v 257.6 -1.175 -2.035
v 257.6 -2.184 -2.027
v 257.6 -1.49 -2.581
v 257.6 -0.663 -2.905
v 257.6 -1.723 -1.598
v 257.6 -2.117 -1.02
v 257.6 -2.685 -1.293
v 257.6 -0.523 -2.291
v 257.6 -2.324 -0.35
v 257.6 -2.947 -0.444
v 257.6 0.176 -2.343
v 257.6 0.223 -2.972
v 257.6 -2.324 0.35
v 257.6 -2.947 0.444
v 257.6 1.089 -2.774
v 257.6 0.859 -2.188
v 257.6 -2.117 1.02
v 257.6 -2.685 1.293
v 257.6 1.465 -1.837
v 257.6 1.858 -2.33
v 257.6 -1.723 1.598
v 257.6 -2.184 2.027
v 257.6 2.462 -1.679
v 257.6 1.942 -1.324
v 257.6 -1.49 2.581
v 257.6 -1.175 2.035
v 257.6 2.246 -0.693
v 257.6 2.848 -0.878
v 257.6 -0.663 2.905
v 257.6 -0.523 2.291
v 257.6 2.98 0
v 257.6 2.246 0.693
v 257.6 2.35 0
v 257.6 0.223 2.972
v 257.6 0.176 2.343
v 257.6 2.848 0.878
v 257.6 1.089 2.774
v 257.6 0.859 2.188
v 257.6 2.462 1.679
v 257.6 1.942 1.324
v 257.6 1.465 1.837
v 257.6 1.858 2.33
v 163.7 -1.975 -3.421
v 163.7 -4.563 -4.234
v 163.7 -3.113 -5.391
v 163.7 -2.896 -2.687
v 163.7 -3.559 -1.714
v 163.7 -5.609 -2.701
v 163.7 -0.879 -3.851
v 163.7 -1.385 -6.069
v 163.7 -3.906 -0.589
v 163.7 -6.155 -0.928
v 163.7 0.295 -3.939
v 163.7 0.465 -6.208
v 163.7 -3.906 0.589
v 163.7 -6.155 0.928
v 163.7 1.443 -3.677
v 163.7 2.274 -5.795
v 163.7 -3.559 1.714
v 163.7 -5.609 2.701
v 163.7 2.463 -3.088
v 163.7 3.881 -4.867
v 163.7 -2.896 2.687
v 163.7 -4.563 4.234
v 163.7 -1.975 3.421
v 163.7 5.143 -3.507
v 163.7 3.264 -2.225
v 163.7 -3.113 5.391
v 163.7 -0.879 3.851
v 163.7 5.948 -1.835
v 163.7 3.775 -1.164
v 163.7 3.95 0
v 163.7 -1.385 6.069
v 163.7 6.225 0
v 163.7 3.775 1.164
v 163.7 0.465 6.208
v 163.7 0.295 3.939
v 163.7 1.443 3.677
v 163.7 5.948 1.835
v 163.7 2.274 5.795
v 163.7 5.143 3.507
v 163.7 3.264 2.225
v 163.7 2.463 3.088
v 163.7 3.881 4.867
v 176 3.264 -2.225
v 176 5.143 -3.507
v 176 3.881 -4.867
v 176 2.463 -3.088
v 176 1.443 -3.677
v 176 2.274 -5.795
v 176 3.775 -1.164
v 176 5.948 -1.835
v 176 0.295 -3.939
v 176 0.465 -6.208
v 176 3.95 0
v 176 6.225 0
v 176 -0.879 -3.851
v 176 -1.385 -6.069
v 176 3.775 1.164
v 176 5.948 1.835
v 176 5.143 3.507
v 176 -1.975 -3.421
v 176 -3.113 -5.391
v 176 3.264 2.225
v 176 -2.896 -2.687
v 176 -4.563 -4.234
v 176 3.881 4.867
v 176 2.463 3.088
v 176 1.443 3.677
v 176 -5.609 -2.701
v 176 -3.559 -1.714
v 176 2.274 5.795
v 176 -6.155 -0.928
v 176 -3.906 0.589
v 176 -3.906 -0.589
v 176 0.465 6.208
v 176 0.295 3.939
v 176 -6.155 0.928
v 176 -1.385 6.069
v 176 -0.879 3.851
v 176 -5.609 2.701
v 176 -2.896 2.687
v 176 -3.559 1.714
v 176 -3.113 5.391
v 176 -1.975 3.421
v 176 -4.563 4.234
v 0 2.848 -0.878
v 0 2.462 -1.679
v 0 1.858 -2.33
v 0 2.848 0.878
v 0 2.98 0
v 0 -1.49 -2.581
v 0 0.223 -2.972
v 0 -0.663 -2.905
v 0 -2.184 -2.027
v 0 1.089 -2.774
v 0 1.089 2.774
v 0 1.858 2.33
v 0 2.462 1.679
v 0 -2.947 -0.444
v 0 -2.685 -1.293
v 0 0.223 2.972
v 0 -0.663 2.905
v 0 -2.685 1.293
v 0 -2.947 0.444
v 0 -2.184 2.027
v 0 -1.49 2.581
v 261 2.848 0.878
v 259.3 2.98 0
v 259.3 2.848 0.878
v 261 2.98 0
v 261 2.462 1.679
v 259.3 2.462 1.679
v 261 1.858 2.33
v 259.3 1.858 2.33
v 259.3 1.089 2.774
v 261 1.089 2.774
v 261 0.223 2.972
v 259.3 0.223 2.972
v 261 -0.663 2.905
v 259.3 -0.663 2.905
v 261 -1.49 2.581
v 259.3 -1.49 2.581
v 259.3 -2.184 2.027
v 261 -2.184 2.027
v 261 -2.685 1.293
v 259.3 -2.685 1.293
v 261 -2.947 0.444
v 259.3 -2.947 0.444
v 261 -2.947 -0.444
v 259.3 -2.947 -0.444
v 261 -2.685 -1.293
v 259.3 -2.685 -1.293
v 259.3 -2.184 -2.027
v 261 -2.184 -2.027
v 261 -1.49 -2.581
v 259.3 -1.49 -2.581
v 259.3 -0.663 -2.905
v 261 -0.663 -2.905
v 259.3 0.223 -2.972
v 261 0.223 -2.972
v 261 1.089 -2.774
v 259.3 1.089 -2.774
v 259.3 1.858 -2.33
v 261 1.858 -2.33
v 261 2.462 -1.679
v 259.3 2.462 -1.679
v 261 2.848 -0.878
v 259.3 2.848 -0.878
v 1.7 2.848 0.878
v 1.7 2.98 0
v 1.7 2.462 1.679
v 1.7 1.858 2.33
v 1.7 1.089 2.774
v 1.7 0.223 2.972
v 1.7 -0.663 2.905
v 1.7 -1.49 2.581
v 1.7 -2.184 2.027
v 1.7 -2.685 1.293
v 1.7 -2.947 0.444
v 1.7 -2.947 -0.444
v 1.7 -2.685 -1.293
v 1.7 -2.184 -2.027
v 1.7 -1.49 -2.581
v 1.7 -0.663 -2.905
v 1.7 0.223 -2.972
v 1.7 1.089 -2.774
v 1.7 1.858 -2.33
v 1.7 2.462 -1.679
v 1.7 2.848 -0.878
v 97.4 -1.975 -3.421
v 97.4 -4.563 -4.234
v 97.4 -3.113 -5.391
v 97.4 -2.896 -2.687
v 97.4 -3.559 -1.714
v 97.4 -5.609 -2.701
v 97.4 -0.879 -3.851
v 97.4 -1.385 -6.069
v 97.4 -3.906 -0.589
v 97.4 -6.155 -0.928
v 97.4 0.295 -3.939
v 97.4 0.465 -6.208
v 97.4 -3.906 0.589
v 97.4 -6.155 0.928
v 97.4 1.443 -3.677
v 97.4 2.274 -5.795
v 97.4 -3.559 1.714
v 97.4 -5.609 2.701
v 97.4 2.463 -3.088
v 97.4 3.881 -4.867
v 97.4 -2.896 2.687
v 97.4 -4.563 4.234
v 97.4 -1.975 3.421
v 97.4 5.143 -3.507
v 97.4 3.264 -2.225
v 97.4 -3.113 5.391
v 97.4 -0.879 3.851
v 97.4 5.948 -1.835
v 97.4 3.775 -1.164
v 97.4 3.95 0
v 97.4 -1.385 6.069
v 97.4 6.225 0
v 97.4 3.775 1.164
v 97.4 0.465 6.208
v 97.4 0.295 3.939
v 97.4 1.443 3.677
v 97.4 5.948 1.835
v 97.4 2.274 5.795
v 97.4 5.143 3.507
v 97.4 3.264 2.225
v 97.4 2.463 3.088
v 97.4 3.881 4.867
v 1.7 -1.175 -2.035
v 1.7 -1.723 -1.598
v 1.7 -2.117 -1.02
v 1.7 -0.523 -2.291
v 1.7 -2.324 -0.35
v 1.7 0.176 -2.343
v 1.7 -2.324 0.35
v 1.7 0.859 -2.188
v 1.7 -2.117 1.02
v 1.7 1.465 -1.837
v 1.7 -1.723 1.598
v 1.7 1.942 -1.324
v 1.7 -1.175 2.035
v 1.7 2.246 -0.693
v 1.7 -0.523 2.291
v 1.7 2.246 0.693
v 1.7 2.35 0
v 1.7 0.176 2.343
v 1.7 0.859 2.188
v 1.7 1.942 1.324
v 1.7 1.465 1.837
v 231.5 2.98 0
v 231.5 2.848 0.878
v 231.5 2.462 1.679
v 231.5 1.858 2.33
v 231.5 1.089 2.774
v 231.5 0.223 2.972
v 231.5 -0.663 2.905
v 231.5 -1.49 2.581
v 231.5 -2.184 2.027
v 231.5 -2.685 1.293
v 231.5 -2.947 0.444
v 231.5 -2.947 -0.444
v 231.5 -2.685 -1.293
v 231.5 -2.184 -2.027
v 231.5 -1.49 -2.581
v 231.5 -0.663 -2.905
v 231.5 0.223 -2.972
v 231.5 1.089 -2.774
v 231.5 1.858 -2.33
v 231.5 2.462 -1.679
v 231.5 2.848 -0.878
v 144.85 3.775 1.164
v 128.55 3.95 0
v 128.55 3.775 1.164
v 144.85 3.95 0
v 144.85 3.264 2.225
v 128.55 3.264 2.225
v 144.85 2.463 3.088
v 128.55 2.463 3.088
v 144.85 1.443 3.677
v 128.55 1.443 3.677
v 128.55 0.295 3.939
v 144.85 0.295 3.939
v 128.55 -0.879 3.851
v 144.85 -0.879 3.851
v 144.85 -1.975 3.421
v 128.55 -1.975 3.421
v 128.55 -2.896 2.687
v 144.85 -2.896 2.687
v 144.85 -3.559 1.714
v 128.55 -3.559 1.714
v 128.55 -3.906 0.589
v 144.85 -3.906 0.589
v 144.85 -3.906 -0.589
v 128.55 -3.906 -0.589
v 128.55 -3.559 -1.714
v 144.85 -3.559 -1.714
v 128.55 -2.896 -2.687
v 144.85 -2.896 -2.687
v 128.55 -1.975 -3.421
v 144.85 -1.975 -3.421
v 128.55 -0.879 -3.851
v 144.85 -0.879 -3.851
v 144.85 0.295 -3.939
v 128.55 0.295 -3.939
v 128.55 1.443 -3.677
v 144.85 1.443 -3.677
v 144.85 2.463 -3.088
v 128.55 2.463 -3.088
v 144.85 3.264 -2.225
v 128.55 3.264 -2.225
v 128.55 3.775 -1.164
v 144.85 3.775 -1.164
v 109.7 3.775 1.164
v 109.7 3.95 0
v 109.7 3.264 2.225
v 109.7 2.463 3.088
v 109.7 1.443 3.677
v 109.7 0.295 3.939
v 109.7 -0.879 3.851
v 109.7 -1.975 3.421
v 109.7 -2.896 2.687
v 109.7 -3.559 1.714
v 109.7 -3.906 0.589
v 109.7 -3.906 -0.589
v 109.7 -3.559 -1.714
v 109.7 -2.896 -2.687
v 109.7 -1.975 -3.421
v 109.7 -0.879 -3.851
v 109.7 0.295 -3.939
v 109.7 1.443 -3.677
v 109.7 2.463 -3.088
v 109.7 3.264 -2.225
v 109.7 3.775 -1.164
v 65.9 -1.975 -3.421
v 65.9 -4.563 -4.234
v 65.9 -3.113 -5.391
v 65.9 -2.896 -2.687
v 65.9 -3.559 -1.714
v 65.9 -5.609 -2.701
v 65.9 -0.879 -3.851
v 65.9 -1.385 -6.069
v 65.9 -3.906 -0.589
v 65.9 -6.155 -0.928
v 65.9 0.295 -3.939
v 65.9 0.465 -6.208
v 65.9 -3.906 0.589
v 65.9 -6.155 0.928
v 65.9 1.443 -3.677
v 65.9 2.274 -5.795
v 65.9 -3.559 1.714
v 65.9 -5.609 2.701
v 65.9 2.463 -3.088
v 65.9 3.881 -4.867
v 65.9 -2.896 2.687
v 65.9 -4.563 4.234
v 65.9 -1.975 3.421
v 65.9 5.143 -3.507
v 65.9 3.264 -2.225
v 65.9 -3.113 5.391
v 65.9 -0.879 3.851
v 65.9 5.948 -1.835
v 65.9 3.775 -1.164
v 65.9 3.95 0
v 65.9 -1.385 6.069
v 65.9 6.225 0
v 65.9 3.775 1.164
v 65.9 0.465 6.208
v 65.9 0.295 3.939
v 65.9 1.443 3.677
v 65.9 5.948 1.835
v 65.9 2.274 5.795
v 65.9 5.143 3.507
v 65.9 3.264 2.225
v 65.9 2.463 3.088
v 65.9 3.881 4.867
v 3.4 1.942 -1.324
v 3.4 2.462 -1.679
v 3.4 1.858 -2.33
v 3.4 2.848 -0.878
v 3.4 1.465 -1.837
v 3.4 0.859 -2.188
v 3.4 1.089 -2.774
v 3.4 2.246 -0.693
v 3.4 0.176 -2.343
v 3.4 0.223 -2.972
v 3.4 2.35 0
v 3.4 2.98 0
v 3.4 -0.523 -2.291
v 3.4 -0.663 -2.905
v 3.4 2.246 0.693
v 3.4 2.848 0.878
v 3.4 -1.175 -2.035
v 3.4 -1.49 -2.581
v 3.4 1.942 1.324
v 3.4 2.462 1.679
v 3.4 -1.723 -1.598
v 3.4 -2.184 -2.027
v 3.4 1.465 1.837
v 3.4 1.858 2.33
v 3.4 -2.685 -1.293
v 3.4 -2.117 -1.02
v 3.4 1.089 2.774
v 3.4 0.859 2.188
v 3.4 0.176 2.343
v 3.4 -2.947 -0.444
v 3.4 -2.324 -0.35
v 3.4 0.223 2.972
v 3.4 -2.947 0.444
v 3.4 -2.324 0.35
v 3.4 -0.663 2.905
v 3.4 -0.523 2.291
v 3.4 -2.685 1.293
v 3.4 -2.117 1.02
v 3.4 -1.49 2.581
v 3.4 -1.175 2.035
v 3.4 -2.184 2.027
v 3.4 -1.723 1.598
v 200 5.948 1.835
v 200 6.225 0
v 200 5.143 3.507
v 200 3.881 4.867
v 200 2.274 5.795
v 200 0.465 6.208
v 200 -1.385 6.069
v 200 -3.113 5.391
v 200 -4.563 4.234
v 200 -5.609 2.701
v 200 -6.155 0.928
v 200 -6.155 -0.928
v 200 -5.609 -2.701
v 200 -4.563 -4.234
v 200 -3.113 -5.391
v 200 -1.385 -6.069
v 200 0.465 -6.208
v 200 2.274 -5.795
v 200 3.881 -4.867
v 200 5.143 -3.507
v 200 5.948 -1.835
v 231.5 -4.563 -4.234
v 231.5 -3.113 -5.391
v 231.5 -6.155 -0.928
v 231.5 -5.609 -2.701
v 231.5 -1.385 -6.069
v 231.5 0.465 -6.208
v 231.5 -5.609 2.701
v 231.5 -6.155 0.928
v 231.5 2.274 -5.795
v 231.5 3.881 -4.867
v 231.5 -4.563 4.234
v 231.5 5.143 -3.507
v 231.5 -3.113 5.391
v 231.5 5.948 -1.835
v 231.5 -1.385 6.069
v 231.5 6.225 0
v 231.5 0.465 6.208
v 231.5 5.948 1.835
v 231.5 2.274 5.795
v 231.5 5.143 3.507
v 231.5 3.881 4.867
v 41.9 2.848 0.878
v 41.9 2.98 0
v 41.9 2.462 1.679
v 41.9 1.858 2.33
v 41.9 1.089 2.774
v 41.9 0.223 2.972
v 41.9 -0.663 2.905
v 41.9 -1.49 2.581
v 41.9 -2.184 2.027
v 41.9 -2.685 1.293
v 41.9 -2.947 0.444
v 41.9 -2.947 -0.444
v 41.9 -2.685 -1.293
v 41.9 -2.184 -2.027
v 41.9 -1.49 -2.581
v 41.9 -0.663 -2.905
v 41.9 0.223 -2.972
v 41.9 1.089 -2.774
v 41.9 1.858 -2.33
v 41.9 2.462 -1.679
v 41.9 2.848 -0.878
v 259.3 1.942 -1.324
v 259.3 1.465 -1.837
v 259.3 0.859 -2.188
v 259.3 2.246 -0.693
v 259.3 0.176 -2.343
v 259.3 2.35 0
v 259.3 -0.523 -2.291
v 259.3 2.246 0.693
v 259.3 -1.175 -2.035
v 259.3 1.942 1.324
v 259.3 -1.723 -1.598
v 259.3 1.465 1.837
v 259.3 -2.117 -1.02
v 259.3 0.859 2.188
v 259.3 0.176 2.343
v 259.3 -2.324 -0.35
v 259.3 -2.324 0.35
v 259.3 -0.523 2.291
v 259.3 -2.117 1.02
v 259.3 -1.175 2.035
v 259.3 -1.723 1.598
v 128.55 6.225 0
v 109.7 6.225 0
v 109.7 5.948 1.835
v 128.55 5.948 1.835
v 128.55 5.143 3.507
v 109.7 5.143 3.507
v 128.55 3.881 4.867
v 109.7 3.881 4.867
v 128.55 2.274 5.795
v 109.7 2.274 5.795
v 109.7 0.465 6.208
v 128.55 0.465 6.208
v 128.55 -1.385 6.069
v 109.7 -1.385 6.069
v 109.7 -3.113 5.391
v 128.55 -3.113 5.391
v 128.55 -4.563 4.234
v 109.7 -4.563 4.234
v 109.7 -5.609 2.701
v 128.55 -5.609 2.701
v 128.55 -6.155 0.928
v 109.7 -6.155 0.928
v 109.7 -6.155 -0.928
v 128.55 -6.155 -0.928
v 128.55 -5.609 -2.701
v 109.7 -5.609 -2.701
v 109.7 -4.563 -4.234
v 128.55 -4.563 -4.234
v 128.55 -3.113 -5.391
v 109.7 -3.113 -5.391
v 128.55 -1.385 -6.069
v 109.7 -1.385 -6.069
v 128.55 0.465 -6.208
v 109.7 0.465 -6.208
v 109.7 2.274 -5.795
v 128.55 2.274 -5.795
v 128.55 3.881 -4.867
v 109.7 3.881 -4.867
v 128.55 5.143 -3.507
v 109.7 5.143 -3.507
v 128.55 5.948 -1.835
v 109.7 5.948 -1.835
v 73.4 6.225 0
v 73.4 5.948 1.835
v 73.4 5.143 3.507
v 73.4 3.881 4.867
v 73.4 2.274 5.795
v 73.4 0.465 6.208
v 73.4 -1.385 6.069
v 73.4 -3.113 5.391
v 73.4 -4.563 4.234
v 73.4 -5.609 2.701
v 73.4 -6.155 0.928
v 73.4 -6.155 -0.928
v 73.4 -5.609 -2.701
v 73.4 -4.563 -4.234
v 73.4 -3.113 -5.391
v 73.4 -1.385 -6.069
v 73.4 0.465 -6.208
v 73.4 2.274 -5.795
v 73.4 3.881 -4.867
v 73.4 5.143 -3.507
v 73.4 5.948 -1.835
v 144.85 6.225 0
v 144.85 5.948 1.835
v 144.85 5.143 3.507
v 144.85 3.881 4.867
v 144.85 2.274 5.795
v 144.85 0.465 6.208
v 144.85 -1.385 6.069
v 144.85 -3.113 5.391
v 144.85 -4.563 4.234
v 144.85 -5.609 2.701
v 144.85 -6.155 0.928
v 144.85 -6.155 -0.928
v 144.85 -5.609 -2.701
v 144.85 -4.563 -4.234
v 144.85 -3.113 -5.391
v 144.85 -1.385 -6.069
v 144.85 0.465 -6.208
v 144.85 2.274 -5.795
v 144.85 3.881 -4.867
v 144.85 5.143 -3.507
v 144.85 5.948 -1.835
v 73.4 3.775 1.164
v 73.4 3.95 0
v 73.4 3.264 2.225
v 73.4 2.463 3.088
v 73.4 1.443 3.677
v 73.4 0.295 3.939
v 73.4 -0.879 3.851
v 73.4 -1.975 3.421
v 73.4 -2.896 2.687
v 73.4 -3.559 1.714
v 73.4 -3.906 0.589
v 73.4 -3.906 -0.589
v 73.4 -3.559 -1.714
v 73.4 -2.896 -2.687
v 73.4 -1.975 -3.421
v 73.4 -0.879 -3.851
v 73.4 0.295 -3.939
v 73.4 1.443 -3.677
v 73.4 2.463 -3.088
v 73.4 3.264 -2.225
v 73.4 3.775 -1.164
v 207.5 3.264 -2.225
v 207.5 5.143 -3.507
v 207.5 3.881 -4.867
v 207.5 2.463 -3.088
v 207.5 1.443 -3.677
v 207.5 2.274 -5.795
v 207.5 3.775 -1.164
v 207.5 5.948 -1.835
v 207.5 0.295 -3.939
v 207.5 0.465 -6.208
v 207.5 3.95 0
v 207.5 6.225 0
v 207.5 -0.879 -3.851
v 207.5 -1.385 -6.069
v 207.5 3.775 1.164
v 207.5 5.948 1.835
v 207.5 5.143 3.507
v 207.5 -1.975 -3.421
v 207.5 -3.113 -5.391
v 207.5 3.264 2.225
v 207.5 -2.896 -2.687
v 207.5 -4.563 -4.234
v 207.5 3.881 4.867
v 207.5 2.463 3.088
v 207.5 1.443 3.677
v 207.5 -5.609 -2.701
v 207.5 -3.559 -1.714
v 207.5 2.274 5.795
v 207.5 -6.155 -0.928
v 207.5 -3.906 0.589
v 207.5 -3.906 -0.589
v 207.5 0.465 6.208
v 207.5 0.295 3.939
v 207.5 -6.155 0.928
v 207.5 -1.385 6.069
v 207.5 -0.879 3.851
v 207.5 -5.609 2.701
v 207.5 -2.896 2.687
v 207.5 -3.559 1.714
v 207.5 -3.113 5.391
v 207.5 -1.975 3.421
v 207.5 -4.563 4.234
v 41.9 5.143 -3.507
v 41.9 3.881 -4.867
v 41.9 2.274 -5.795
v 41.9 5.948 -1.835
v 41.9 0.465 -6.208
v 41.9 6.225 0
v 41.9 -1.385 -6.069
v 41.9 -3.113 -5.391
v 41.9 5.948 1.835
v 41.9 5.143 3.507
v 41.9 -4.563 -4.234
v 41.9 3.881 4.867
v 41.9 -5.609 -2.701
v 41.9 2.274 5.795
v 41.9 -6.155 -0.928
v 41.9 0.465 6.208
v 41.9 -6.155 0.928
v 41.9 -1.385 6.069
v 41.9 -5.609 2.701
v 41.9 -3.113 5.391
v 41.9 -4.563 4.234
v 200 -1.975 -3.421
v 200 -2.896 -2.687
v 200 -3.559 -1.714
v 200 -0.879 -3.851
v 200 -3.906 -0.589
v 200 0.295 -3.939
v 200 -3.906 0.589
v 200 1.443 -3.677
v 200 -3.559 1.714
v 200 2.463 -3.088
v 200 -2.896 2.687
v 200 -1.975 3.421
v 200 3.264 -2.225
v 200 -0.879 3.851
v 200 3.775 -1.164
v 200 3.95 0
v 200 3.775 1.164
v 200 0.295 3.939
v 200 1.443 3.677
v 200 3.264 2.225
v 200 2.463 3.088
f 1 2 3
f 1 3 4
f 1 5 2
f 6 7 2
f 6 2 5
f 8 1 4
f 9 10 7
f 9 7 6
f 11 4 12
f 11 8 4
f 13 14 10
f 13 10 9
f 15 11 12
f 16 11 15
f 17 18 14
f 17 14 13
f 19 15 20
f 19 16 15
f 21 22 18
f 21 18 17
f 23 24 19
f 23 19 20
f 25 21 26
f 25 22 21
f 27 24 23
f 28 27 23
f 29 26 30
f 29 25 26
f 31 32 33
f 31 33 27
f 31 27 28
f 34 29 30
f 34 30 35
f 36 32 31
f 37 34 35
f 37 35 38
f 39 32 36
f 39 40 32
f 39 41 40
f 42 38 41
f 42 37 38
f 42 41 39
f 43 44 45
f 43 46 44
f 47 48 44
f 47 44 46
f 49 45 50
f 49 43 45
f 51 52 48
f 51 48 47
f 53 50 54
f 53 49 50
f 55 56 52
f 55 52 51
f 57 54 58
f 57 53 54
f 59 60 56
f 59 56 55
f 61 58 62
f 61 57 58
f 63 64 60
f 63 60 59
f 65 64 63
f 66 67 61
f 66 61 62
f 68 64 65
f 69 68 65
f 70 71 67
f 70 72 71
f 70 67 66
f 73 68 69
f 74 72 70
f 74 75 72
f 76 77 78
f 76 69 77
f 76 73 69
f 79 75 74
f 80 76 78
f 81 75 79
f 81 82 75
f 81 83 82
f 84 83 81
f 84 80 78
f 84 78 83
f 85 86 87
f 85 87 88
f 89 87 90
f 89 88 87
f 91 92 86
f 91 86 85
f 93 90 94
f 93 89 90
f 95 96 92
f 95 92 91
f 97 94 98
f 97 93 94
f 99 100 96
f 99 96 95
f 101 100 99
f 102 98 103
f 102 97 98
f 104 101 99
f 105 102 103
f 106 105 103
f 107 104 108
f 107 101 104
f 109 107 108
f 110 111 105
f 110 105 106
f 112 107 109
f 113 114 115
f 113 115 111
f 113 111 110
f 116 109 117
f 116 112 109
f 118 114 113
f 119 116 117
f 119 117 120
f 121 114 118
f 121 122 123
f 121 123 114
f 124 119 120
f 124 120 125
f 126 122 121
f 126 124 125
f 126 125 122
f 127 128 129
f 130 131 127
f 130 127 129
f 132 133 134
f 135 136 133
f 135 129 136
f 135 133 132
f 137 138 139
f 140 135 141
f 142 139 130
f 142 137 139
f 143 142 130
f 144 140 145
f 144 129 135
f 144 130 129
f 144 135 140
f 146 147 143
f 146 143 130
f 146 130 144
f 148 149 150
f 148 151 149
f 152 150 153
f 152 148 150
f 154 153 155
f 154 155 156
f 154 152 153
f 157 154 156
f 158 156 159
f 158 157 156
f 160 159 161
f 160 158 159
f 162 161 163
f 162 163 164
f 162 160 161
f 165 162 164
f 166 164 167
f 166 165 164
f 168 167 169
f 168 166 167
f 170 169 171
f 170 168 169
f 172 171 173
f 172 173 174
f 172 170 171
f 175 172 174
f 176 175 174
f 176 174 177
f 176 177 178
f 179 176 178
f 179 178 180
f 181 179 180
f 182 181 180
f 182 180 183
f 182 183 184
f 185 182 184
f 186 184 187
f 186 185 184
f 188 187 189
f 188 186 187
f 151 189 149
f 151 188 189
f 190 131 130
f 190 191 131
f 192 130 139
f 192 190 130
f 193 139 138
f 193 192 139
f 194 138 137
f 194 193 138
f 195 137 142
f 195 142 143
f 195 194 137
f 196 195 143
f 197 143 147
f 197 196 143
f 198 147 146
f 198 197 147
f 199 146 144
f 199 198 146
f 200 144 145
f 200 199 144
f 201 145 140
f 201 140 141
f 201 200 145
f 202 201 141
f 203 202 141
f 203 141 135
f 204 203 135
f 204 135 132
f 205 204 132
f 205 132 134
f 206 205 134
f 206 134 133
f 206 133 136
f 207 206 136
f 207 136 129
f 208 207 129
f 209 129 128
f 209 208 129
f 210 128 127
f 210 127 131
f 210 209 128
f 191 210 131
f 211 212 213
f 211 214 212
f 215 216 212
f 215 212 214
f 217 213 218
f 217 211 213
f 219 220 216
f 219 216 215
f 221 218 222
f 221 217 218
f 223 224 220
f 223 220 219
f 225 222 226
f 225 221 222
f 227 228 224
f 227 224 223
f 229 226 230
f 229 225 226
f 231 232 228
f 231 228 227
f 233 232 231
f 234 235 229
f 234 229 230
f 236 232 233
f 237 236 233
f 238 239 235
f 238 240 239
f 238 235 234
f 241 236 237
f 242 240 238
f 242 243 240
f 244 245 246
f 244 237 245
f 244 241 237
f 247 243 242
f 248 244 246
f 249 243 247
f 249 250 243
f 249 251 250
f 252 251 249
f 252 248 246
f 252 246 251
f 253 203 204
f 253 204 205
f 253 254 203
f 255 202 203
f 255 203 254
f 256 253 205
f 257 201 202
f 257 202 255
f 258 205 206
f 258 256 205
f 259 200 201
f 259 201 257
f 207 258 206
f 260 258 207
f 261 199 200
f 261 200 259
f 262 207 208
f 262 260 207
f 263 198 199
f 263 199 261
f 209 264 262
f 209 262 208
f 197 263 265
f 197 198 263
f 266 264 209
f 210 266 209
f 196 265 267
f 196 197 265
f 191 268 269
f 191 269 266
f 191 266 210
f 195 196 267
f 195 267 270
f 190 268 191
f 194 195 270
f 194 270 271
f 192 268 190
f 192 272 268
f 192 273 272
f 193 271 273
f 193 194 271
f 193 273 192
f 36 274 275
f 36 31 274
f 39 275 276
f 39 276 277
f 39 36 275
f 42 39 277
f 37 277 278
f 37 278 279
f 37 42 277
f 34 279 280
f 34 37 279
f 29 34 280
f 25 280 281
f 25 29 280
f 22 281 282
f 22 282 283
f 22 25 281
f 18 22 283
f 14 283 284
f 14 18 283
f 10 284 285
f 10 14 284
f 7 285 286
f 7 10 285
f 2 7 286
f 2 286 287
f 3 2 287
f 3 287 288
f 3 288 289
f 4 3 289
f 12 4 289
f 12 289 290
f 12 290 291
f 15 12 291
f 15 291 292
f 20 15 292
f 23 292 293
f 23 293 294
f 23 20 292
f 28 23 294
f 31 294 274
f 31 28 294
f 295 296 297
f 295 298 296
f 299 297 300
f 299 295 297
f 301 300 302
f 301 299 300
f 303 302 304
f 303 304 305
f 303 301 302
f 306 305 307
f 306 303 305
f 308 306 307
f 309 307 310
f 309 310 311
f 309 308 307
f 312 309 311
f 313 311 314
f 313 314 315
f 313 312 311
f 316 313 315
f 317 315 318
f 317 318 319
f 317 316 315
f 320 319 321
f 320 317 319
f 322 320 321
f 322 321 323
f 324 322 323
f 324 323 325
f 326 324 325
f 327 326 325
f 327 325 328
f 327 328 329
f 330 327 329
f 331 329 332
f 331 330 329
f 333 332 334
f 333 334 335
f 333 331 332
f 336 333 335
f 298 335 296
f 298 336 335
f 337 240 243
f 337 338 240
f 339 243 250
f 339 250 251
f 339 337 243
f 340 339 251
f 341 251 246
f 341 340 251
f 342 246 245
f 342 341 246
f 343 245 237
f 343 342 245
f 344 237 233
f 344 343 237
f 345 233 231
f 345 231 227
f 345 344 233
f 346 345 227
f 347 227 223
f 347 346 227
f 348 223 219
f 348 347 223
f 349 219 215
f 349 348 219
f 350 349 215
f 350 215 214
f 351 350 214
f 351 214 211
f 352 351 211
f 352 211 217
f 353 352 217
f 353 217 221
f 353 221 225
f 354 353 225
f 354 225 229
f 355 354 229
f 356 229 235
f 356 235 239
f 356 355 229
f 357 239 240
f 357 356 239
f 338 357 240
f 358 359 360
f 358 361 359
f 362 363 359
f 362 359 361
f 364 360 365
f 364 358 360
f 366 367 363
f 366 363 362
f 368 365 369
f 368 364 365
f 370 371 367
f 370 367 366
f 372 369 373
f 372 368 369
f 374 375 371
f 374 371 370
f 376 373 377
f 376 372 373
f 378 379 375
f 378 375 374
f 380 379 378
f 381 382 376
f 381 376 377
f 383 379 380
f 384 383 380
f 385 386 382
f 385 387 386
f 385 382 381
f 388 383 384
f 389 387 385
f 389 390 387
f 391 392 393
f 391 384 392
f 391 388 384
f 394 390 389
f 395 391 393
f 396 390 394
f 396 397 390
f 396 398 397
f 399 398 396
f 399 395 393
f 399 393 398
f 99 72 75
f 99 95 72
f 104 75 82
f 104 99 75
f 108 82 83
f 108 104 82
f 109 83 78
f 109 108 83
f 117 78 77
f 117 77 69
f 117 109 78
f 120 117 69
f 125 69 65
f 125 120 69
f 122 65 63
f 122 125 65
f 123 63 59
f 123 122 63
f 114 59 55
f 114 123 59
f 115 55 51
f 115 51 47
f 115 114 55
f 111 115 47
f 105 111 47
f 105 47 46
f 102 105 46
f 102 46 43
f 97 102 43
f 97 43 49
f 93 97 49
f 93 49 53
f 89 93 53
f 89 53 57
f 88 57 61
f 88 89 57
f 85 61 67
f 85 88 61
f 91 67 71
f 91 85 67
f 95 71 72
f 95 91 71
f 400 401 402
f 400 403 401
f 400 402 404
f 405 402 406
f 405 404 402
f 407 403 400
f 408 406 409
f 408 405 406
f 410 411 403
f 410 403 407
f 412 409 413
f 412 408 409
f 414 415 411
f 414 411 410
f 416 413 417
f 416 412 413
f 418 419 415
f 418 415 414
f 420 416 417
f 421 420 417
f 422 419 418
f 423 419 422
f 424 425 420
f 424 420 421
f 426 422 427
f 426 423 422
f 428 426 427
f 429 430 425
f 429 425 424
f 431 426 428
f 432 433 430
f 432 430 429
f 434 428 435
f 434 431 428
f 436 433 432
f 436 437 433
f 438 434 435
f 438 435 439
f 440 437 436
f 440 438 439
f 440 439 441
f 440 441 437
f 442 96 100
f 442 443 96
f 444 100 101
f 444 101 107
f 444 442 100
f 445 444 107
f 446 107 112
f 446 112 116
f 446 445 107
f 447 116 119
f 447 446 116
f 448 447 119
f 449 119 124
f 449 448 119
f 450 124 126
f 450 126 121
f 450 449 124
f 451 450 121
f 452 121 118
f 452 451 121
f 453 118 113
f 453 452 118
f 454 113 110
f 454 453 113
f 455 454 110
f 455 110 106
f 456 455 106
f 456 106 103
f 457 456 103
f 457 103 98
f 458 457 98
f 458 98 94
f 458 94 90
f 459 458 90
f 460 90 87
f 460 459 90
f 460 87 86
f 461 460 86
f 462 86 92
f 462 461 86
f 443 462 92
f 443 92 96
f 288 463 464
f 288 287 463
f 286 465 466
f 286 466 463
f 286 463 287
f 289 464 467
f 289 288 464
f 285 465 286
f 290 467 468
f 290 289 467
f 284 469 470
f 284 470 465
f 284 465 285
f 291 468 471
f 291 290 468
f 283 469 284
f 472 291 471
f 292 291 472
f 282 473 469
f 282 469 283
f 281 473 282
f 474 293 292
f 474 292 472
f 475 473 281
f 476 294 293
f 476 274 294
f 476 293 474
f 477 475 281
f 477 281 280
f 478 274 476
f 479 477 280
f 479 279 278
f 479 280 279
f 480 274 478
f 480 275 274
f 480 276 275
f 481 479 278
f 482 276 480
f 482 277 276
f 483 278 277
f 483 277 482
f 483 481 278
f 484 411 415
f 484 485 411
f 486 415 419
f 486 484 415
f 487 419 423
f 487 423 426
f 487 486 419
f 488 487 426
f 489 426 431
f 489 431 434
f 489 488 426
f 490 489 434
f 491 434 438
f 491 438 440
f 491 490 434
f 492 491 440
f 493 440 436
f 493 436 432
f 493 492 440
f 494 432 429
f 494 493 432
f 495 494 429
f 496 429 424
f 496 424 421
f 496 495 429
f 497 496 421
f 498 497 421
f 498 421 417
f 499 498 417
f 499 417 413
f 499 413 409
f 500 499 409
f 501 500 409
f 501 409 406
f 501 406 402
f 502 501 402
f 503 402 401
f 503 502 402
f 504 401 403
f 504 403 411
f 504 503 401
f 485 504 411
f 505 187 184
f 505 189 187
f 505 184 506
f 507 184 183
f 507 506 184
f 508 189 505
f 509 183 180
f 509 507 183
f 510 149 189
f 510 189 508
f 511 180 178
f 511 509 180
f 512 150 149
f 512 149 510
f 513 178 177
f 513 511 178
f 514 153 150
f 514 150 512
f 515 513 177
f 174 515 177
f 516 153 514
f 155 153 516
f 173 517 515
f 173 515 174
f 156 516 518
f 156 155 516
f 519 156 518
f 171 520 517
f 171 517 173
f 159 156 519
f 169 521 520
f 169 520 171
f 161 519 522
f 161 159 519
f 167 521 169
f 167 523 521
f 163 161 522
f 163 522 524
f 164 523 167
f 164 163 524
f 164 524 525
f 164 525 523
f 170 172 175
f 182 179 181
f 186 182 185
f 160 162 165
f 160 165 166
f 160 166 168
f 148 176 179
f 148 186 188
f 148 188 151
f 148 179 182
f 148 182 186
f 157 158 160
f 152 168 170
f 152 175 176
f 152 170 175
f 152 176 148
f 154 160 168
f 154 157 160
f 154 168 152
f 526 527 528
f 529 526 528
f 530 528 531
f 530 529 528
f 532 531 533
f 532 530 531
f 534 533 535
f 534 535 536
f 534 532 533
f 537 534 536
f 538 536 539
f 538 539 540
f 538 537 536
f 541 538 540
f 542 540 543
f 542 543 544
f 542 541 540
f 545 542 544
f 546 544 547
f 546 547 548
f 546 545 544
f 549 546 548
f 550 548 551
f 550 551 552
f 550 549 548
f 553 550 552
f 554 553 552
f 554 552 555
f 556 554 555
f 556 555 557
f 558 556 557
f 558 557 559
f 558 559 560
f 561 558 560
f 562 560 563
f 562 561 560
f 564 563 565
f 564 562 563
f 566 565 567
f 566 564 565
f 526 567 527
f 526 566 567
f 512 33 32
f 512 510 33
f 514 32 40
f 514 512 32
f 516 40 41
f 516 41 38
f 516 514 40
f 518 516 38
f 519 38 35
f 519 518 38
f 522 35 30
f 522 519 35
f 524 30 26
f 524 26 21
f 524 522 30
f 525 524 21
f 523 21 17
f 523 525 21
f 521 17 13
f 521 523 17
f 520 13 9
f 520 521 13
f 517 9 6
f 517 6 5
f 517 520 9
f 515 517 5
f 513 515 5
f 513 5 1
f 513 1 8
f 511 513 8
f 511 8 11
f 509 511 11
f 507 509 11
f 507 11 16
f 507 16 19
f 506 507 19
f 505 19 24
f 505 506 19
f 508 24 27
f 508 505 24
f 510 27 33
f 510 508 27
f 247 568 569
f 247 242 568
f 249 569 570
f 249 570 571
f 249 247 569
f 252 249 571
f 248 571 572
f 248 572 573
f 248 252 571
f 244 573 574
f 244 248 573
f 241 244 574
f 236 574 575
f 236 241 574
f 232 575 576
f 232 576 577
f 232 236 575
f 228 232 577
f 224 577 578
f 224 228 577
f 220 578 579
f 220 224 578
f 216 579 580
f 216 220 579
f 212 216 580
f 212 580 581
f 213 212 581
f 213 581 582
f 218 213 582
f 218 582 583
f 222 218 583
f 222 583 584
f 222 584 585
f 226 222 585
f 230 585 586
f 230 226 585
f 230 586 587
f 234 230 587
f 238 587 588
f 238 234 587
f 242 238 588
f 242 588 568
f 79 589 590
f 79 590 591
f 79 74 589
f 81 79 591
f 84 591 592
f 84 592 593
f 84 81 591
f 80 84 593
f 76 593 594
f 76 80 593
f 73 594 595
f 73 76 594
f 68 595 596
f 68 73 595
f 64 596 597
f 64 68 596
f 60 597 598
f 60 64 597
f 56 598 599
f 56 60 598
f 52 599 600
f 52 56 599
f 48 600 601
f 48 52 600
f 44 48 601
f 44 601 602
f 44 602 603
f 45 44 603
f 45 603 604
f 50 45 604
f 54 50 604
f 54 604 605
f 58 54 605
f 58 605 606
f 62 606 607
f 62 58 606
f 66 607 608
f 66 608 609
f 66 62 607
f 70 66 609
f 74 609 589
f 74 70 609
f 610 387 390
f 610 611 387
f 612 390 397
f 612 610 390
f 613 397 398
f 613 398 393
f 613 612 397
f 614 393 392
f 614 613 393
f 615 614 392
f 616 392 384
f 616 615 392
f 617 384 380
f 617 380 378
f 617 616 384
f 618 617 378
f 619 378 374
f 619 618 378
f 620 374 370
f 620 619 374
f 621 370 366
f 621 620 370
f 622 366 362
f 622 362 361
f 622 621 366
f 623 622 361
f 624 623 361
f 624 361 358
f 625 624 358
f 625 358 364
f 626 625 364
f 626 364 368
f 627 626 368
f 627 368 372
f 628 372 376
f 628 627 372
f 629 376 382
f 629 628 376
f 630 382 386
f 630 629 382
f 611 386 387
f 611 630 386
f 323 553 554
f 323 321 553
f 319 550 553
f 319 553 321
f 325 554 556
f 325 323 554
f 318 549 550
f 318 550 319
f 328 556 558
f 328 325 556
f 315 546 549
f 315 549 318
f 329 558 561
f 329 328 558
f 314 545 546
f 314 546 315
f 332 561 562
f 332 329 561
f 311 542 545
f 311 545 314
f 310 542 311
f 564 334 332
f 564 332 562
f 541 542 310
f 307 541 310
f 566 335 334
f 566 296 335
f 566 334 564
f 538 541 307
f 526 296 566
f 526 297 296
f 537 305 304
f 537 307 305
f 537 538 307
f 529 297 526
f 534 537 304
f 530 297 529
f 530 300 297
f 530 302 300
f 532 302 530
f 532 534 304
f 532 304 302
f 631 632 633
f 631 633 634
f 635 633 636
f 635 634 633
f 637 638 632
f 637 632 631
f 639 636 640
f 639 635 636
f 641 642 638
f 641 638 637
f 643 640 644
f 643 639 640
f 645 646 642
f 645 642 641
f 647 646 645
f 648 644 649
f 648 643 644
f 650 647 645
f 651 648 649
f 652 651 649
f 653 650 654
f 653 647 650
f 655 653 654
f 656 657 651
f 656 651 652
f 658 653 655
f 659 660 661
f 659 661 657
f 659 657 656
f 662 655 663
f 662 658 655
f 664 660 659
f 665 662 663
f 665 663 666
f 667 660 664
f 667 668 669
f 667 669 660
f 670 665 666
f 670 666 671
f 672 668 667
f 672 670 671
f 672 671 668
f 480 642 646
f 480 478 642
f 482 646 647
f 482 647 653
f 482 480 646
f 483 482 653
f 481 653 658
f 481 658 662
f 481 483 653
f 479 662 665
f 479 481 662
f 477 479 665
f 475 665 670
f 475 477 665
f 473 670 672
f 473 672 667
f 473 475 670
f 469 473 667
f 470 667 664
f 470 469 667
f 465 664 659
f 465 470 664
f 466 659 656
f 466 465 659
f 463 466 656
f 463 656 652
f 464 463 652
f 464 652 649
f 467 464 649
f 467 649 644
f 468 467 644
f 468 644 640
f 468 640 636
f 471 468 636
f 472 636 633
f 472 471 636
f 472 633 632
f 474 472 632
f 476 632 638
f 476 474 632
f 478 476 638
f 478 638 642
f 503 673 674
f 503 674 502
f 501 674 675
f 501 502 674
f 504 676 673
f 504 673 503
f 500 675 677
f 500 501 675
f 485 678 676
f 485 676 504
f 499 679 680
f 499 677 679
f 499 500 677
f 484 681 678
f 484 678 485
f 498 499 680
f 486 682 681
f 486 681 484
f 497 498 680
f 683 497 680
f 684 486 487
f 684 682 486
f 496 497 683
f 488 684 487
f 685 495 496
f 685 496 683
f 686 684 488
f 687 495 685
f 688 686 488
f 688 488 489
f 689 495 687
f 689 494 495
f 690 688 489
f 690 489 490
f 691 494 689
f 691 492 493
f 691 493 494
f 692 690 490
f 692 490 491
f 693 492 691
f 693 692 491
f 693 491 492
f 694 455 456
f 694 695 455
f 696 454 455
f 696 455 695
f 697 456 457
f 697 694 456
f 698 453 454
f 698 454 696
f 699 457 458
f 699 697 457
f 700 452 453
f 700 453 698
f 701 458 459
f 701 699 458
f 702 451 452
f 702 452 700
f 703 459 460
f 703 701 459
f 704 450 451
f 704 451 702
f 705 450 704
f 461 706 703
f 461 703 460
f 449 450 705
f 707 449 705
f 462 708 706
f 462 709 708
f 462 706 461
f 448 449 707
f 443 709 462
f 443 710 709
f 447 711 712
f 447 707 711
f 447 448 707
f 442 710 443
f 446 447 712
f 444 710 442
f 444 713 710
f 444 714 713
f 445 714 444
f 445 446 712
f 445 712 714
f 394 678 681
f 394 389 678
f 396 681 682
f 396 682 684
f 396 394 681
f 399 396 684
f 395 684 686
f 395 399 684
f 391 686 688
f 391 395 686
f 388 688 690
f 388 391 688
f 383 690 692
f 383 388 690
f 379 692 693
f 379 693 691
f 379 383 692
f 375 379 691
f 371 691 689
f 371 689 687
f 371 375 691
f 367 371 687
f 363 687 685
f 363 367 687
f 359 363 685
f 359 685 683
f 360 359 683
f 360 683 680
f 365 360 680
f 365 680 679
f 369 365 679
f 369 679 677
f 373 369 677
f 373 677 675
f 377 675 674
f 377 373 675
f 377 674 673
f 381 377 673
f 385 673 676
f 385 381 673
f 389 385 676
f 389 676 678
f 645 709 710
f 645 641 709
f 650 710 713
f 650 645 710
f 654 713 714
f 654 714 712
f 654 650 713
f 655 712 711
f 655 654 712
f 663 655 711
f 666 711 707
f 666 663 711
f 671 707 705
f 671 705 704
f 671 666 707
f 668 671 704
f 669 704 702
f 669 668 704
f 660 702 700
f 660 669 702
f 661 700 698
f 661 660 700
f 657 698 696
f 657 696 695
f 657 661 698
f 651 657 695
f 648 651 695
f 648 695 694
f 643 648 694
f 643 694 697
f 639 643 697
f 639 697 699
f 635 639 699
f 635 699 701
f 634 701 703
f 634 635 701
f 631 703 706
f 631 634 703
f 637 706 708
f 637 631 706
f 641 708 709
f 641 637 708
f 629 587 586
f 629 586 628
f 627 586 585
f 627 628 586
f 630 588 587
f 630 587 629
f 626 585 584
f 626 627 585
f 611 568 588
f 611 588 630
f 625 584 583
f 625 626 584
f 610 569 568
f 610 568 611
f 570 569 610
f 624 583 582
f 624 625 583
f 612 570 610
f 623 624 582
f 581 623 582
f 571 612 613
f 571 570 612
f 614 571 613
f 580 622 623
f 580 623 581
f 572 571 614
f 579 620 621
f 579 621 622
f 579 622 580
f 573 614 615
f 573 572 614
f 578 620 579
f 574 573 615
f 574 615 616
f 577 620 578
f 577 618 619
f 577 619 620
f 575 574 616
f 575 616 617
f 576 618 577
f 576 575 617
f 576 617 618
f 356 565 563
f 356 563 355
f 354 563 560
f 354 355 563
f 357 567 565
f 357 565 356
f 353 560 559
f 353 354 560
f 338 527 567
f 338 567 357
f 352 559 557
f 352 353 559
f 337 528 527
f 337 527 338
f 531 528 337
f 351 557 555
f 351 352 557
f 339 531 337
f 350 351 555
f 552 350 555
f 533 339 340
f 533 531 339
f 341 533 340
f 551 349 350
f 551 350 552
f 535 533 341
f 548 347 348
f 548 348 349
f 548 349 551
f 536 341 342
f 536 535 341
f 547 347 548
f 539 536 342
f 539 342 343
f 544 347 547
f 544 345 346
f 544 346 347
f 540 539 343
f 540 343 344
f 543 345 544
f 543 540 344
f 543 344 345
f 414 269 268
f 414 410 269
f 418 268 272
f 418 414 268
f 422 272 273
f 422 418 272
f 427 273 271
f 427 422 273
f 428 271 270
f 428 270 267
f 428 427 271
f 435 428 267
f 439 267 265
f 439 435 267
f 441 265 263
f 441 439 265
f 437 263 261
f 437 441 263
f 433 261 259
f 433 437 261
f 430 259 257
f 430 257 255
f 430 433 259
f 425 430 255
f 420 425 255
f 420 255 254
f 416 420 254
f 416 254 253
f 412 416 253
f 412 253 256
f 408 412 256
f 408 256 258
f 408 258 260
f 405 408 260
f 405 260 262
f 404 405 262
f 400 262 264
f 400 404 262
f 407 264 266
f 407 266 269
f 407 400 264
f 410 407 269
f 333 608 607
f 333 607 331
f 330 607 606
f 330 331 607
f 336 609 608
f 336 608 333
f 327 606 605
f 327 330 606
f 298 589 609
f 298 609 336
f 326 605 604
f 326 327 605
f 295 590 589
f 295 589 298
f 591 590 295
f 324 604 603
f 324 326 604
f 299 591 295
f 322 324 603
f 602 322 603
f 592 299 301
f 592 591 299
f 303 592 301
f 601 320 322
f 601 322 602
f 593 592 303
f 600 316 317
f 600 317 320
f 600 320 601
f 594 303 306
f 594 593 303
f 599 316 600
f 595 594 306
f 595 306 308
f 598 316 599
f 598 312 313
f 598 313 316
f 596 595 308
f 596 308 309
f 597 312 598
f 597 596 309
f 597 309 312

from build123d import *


with BuildPart() as part:
    # Esquisse1 → Révolution1 (revolve)
    with BuildSketch(Plane.XY):
        Polygon((0, 0), (0, 2.98), (1.7, 2.98), (1.7, 2.35), (3.4, 2.35), (3.4, 2.98), (41.9, 2.98), (41.9, 6.225), (65.9, 6.225), (65.9, 3.95), (73.4, 3.95), (73.4, 6.225), (97.4, 6.225), (97.4, 3.95), (109.7, 3.95), (109.7, 6.225), (128.55, 6.225), (128.55, 3.95), (144.85, 3.95), (144.85, 6.225), (163.7, 6.225), (163.7, 3.95), (176, 3.95), (176, 6.225), (200, 6.225), (200, 3.95), (207.5, 3.95), (207.5, 6.225), (231.5, 6.225), (231.5, 2.98), (257.6, 2.98), (257.6, 2.35), (259.3, 2.35), (259.3, 2.98), (261, 2.98), (261, 0), align=None)
    revolve(axis=Axis((0, 0, 0), (1, 0, 0)))


solid = part.part
